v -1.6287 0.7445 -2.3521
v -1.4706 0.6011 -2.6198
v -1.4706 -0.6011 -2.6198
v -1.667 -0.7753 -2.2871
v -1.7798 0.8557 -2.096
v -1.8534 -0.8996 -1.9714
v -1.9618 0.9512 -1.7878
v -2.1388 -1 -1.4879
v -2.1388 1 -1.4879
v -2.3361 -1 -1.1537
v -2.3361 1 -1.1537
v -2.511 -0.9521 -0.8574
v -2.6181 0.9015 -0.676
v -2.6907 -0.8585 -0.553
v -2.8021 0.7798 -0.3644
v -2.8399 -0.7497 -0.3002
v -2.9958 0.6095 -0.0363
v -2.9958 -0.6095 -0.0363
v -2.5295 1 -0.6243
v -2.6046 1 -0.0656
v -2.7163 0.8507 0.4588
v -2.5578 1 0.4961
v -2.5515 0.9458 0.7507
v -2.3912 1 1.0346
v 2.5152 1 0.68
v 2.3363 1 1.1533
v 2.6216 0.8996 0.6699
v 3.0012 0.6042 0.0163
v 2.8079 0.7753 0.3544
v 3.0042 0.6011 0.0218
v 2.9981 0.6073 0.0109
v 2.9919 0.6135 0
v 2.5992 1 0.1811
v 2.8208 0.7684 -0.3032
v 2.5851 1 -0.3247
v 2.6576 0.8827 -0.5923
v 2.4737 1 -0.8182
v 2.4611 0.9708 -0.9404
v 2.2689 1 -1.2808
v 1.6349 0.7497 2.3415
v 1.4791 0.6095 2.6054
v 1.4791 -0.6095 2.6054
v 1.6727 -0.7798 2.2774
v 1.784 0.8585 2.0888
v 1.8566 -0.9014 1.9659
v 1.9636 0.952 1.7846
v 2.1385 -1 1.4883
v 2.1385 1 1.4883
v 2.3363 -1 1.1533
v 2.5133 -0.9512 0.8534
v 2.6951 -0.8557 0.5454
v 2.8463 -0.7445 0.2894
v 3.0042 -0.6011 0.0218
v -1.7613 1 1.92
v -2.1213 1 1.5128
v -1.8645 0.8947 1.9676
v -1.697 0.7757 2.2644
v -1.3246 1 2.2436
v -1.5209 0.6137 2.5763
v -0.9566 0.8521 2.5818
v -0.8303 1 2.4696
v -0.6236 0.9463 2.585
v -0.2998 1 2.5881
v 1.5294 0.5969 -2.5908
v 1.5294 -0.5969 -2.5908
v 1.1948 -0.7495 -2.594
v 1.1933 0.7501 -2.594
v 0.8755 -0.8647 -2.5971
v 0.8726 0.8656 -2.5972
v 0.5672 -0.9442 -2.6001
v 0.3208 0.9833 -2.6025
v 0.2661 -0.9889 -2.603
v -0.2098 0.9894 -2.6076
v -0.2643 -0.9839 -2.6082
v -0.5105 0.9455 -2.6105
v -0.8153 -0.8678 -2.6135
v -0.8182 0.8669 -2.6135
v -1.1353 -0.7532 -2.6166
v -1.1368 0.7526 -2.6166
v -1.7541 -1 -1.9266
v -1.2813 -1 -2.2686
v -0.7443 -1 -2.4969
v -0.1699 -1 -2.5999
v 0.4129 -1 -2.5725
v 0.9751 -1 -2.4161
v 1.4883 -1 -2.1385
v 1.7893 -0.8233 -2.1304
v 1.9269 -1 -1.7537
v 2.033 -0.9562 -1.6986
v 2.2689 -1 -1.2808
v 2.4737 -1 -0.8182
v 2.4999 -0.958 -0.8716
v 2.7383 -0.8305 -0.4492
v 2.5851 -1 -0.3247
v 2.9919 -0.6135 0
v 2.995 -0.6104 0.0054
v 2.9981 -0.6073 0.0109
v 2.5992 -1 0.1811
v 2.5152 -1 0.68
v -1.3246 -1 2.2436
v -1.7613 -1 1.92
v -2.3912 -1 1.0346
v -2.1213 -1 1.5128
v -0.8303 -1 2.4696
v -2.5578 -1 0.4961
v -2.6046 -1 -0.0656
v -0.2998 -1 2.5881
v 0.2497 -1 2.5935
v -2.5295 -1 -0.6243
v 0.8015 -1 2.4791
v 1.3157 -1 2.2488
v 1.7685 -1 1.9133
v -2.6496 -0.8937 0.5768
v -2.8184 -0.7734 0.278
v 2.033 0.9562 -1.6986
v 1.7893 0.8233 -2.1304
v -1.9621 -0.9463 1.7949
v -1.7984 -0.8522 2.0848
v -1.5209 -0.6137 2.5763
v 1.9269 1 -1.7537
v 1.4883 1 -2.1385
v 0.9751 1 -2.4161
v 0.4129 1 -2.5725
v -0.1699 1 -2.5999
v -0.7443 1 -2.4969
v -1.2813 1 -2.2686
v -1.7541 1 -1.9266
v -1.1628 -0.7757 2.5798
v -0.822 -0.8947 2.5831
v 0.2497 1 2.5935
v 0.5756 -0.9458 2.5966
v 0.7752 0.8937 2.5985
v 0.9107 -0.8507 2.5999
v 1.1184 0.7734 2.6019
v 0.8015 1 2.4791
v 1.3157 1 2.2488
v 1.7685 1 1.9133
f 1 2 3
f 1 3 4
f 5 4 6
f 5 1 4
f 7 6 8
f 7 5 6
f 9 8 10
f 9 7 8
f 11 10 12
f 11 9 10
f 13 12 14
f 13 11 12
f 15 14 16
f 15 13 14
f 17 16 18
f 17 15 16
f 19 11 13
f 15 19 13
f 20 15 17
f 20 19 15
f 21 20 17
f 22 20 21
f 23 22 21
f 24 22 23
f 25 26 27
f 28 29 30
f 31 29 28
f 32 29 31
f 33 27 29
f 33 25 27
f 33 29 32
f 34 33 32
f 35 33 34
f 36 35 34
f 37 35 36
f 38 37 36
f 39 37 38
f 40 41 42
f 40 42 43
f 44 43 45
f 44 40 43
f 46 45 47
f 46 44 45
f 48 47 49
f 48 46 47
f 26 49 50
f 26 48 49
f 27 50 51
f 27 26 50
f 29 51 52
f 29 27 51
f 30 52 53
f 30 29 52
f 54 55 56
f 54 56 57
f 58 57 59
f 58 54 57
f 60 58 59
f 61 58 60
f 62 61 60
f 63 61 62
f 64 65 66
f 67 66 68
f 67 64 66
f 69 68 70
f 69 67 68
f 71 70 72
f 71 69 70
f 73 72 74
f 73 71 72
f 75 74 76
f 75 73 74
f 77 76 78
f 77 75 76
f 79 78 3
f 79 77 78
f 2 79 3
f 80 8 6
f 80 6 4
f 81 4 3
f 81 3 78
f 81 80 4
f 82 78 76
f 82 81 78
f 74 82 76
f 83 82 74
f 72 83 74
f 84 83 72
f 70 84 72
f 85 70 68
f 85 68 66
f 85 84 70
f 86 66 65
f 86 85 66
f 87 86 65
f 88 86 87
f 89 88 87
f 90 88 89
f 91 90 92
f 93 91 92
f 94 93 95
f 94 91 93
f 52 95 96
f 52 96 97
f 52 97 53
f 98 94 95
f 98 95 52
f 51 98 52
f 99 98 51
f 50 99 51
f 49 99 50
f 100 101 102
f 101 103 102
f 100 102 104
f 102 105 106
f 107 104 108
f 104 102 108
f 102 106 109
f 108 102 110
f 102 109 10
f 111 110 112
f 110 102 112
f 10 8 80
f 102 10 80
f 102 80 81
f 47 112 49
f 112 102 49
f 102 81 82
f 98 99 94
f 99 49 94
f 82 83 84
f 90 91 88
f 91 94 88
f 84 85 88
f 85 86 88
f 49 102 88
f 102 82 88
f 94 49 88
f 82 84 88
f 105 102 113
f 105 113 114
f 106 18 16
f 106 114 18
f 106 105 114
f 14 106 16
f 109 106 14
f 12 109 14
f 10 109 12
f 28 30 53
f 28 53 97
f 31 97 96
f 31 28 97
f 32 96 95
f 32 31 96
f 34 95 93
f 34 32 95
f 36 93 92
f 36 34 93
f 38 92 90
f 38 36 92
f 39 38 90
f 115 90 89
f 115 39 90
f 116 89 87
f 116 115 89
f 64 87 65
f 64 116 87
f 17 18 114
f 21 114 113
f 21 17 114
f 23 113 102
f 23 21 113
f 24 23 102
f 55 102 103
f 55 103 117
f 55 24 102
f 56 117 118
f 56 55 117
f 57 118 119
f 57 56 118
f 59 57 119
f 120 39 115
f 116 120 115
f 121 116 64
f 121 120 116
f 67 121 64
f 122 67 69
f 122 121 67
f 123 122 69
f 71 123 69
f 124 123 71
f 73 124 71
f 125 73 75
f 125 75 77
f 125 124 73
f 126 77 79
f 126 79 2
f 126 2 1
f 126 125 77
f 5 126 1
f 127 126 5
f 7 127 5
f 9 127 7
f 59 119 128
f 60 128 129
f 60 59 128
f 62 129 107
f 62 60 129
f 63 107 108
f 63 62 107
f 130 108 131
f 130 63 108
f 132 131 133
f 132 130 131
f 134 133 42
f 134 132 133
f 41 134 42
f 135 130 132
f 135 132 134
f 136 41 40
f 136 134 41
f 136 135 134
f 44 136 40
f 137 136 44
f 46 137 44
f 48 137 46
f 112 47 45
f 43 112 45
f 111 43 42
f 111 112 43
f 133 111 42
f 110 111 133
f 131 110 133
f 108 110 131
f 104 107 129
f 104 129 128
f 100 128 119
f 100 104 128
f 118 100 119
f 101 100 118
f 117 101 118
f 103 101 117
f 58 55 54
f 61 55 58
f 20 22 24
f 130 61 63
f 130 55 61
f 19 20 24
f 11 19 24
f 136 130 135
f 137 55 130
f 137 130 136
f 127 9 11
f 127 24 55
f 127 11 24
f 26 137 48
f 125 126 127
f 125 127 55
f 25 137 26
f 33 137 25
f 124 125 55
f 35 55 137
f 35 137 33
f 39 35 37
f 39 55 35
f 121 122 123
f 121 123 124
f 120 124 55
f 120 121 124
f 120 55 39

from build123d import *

# Parameters (mm, degrees)
EXTRUDE_1_DEPTH          = 1
SKETCH_2_OUTSIDE_W       = 20.56
SKETCH_2_OUTSIDE_H       = 19.785
SKETCH_2_OUTSIDE_R       = 2.605451242
CUT_EXTRUDE_1_DEPTH      = 5.459704035
CUT_EXTRUDE_1_DRAFT      = -45
MIRROR_1_COPY_1_SKETCH_W = 20.56
MIRROR_1_COPY_1_SKETCH_H = 19.785
MIRROR_1_COPY_1_SKETCH_R = 2.605451242
MIRROR_1_COPY_1_DEPTH    = 5.459704035
MIRROR_1_COPY_1_DRAFT    = -45


with BuildPart() as part:
    # 草图1 → 凸台-拉伸1 (new, symmetric)
    with BuildSketch(Plane(origin=(0, 0, 0), x_dir=(1, 0, 0), z_dir=(0, 1, 0))):
        Polygon((-1.520889796, -2.576331008), (1.479110204, -2.605355672), (3.0042463, -0.021791793), (1.529382397, 2.59079675), (-1.470617603, 2.619821415), (-2.9957537, 0.036257535), align=None)
    extrude(amount=EXTRUDE_1_DEPTH, both=True)


with BuildPart() as cut_extrude_1_tool:
    # 草图2 outside → 切除-拉伸1 (with draft: the straight prism first)
    with BuildSketch(Plane(origin=(0, 1, 0), x_dir=(1, 0, 0), z_dir=(0, 1, 0))):
        with Locations((0.004, 0.0075)):
            Rectangle(SKETCH_2_OUTSIDE_W, SKETCH_2_OUTSIDE_H)
        Circle(SKETCH_2_OUTSIDE_R, mode=Mode.SUBTRACT)
    extrude(amount=-CUT_EXTRUDE_1_DEPTH)
    # 切除-拉伸1: the draft: its side faces are tilted about the plane it starts from
    cut_extrude_1_sides = [cut_extrude_1_tool.faces().sort_by_distance(p)[0] for p in [
        (0.004, -1.729852017, 9.885),
        (10.284, -1.729852017, -0.0075),
        (0.004, -1.729852017, -9.9),
        (-10.276, -1.729852017, -0.0075),
        (-2.605451242, -1.729852017, 0),
    ]]
    draft(cut_extrude_1_sides, Plane(origin=(0, 1, 0), x_dir=(1, 0, 0), z_dir=(0, 1, 0)), CUT_EXTRUDE_1_DRAFT)


with BuildPart() as part_1:
    add(part.part)

    # 切除-拉伸1: cut by cut_extrude_1_tool
    add(cut_extrude_1_tool.part, mode=Mode.SUBTRACT)


with BuildPart() as mirror_1_copy_1_tool:
    # 镜向1 copy 1 sketch → 镜向1 copy 1 (with draft: the straight prism first)
    with BuildSketch(Plane.XZ.offset(1)):
        with Locations((0.004, -0.0075)):
            Rectangle(MIRROR_1_COPY_1_SKETCH_W, MIRROR_1_COPY_1_SKETCH_H)
        Circle(MIRROR_1_COPY_1_SKETCH_R, mode=Mode.SUBTRACT)
    extrude(amount=-MIRROR_1_COPY_1_DEPTH)
    # 镜向1 copy 1: the draft: its side faces are tilted about the plane it starts from
    mirror_1_copy_1_sides = [mirror_1_copy_1_tool.faces().sort_by_distance(p)[0] for p in [
        (0.004, 1.729852017, 9.885),
        (10.284, 1.729852017, -0.0075),
        (0.004, 1.729852017, -9.9),
        (-10.276, 1.729852017, -0.0075),
        (-2.605451242, 1.729852017, 0),
    ]]
    draft(mirror_1_copy_1_sides, Plane.XZ.offset(1), MIRROR_1_COPY_1_DRAFT)


with BuildPart() as part_2:
    add(part_1.part)

    # 镜向1 copy 1: cut by mirror_1_copy_1_tool
    add(mirror_1_copy_1_tool.part, mode=Mode.SUBTRACT)


solid = part_2.part
